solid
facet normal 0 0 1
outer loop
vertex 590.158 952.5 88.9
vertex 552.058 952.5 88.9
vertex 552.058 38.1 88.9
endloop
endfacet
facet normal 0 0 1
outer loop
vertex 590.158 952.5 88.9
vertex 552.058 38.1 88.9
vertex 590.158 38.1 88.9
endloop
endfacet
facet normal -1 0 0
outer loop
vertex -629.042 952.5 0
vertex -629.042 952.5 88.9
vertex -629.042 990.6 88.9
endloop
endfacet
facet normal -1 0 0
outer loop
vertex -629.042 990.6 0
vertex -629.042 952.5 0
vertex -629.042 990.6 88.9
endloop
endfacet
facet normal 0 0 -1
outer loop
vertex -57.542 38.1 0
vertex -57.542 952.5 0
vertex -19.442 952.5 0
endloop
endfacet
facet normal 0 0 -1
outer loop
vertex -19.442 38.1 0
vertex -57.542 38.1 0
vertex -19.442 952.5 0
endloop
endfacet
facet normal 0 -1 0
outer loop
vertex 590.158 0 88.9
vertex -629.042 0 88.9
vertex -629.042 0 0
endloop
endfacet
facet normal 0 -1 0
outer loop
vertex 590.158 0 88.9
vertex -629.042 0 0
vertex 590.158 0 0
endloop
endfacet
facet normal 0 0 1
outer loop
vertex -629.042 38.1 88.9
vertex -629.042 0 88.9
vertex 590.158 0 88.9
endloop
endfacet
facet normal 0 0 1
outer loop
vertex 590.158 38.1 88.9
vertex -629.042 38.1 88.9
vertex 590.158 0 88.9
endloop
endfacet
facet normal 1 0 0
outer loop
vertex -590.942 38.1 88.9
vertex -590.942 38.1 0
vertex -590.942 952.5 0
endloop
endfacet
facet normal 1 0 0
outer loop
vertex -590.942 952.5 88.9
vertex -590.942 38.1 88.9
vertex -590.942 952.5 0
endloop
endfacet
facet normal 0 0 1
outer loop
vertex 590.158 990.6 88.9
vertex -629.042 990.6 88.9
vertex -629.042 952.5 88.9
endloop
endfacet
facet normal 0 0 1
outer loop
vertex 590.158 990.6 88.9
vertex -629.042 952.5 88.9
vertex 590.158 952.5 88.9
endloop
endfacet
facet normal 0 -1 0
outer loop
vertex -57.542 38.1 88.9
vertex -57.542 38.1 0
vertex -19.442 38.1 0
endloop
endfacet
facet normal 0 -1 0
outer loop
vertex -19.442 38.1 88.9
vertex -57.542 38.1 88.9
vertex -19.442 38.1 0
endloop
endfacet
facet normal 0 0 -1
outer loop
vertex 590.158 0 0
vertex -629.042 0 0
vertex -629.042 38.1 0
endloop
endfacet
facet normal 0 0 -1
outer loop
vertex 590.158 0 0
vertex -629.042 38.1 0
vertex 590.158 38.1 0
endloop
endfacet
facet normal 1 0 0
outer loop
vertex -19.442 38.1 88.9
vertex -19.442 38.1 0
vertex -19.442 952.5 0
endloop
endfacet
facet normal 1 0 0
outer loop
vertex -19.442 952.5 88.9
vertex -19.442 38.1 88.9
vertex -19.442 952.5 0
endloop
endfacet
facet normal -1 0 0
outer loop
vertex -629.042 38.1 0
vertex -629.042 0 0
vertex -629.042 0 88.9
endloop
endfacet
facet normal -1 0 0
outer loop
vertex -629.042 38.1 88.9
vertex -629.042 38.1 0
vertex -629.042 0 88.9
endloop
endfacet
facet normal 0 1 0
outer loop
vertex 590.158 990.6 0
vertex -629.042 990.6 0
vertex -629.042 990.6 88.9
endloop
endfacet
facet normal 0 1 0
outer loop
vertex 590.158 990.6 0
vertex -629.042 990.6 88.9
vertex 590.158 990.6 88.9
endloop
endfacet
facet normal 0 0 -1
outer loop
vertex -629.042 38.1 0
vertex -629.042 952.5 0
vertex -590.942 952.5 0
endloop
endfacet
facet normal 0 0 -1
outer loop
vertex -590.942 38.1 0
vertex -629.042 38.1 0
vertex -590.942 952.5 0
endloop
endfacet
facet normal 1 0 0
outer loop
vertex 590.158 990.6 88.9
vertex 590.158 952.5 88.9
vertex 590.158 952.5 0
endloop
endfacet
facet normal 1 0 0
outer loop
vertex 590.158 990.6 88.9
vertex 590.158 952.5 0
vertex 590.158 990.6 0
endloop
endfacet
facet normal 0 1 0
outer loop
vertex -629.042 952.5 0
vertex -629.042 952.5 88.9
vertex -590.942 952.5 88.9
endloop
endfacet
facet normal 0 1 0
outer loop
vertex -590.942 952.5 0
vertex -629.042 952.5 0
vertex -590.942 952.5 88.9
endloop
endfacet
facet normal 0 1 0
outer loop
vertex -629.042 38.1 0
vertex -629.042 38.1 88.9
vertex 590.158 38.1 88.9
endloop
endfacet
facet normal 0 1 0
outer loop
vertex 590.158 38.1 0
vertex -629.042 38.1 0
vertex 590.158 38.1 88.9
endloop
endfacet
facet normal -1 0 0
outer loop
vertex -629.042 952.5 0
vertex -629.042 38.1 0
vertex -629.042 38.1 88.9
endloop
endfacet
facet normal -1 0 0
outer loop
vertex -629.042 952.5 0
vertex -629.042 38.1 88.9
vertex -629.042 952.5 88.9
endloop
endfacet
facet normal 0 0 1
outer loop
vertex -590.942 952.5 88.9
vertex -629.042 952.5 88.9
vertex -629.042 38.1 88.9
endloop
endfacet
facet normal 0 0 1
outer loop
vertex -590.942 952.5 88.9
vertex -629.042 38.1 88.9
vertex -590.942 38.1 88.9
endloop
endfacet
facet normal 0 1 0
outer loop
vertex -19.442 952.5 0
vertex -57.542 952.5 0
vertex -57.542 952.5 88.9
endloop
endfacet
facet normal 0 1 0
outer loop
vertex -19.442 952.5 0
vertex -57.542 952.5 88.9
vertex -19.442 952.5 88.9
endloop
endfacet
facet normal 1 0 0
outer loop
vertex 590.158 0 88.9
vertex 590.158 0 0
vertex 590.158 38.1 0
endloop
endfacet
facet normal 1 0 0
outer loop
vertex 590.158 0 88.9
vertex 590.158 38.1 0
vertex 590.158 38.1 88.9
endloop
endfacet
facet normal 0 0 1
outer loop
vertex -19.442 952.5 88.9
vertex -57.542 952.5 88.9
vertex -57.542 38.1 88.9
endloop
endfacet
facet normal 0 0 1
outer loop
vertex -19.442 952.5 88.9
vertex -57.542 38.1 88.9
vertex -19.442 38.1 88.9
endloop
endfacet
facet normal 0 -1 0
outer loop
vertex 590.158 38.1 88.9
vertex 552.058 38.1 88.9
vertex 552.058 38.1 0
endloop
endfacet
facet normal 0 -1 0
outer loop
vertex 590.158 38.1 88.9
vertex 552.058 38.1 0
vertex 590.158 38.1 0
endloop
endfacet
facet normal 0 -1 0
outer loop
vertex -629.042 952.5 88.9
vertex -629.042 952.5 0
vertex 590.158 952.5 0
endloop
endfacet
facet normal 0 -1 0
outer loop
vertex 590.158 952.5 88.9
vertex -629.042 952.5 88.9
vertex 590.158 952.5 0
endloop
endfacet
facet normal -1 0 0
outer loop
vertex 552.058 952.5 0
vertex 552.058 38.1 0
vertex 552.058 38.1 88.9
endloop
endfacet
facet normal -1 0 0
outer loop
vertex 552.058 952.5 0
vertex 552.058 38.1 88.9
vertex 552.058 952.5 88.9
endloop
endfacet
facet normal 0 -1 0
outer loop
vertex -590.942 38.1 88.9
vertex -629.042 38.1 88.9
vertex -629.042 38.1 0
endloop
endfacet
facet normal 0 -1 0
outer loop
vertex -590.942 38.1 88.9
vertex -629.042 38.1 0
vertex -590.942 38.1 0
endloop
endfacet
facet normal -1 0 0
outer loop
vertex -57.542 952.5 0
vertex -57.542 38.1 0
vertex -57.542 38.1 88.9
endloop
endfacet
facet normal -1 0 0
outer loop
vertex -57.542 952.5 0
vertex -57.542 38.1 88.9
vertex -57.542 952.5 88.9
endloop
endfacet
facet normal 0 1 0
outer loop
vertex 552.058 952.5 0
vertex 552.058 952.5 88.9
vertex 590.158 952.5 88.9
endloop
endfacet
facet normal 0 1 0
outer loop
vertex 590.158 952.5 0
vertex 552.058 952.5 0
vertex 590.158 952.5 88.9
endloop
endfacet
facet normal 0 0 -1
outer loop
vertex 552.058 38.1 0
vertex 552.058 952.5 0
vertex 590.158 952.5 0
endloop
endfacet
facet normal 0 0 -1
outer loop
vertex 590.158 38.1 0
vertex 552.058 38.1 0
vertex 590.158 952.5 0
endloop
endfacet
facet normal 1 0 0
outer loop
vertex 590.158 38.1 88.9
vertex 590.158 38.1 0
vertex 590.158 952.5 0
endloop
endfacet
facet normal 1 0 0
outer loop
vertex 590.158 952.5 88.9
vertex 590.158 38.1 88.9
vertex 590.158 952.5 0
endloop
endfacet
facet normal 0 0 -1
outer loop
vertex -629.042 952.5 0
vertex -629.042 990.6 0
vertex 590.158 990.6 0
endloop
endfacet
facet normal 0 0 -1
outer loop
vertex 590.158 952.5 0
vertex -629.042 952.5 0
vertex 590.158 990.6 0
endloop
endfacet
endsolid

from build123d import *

# Parameters (mm, degrees)
F0_W     = 1219.2
F0_H     = 88.9
F1_DEPTH = 38.1
F2_W     = 38.1
F2_H     = 914.4
F3_DEPTH = 88.9
F4_W     = 1219.2
F4_H     = 38.1
F5_DEPTH = 88.9


with BuildPart() as f1:
    # F0 (on Front) → F1 (new body)
    with BuildSketch(Plane.XZ):
        with Locations((-19.442329, 44.45)):
            Rectangle(F0_W, F0_H)
    extrude(amount=-F1_DEPTH)


with BuildPart() as f3:
    # F2 (on Top) → F3 (new body)
    with BuildSketch(Plane.XY):
        with Locations((-609.992329, 495.3)):
            Rectangle(F2_W, F2_H)
        with Locations((571.107671, 495.3)):
            Rectangle(F2_W, F2_H)
        with Locations((-38.492329, 495.3)):
            Rectangle(F2_W, F2_H)
    extrude(amount=F3_DEPTH)


with BuildPart() as f5:
    # F4 (on Top) → F5 (new body)
    with BuildSketch(Plane.XY):
        with Locations((-19.442329, 971.55)):
            Rectangle(F4_W, F4_H)
    extrude(amount=F5_DEPTH)


solid = Compound([f1.part, f3.part, f5.part])
